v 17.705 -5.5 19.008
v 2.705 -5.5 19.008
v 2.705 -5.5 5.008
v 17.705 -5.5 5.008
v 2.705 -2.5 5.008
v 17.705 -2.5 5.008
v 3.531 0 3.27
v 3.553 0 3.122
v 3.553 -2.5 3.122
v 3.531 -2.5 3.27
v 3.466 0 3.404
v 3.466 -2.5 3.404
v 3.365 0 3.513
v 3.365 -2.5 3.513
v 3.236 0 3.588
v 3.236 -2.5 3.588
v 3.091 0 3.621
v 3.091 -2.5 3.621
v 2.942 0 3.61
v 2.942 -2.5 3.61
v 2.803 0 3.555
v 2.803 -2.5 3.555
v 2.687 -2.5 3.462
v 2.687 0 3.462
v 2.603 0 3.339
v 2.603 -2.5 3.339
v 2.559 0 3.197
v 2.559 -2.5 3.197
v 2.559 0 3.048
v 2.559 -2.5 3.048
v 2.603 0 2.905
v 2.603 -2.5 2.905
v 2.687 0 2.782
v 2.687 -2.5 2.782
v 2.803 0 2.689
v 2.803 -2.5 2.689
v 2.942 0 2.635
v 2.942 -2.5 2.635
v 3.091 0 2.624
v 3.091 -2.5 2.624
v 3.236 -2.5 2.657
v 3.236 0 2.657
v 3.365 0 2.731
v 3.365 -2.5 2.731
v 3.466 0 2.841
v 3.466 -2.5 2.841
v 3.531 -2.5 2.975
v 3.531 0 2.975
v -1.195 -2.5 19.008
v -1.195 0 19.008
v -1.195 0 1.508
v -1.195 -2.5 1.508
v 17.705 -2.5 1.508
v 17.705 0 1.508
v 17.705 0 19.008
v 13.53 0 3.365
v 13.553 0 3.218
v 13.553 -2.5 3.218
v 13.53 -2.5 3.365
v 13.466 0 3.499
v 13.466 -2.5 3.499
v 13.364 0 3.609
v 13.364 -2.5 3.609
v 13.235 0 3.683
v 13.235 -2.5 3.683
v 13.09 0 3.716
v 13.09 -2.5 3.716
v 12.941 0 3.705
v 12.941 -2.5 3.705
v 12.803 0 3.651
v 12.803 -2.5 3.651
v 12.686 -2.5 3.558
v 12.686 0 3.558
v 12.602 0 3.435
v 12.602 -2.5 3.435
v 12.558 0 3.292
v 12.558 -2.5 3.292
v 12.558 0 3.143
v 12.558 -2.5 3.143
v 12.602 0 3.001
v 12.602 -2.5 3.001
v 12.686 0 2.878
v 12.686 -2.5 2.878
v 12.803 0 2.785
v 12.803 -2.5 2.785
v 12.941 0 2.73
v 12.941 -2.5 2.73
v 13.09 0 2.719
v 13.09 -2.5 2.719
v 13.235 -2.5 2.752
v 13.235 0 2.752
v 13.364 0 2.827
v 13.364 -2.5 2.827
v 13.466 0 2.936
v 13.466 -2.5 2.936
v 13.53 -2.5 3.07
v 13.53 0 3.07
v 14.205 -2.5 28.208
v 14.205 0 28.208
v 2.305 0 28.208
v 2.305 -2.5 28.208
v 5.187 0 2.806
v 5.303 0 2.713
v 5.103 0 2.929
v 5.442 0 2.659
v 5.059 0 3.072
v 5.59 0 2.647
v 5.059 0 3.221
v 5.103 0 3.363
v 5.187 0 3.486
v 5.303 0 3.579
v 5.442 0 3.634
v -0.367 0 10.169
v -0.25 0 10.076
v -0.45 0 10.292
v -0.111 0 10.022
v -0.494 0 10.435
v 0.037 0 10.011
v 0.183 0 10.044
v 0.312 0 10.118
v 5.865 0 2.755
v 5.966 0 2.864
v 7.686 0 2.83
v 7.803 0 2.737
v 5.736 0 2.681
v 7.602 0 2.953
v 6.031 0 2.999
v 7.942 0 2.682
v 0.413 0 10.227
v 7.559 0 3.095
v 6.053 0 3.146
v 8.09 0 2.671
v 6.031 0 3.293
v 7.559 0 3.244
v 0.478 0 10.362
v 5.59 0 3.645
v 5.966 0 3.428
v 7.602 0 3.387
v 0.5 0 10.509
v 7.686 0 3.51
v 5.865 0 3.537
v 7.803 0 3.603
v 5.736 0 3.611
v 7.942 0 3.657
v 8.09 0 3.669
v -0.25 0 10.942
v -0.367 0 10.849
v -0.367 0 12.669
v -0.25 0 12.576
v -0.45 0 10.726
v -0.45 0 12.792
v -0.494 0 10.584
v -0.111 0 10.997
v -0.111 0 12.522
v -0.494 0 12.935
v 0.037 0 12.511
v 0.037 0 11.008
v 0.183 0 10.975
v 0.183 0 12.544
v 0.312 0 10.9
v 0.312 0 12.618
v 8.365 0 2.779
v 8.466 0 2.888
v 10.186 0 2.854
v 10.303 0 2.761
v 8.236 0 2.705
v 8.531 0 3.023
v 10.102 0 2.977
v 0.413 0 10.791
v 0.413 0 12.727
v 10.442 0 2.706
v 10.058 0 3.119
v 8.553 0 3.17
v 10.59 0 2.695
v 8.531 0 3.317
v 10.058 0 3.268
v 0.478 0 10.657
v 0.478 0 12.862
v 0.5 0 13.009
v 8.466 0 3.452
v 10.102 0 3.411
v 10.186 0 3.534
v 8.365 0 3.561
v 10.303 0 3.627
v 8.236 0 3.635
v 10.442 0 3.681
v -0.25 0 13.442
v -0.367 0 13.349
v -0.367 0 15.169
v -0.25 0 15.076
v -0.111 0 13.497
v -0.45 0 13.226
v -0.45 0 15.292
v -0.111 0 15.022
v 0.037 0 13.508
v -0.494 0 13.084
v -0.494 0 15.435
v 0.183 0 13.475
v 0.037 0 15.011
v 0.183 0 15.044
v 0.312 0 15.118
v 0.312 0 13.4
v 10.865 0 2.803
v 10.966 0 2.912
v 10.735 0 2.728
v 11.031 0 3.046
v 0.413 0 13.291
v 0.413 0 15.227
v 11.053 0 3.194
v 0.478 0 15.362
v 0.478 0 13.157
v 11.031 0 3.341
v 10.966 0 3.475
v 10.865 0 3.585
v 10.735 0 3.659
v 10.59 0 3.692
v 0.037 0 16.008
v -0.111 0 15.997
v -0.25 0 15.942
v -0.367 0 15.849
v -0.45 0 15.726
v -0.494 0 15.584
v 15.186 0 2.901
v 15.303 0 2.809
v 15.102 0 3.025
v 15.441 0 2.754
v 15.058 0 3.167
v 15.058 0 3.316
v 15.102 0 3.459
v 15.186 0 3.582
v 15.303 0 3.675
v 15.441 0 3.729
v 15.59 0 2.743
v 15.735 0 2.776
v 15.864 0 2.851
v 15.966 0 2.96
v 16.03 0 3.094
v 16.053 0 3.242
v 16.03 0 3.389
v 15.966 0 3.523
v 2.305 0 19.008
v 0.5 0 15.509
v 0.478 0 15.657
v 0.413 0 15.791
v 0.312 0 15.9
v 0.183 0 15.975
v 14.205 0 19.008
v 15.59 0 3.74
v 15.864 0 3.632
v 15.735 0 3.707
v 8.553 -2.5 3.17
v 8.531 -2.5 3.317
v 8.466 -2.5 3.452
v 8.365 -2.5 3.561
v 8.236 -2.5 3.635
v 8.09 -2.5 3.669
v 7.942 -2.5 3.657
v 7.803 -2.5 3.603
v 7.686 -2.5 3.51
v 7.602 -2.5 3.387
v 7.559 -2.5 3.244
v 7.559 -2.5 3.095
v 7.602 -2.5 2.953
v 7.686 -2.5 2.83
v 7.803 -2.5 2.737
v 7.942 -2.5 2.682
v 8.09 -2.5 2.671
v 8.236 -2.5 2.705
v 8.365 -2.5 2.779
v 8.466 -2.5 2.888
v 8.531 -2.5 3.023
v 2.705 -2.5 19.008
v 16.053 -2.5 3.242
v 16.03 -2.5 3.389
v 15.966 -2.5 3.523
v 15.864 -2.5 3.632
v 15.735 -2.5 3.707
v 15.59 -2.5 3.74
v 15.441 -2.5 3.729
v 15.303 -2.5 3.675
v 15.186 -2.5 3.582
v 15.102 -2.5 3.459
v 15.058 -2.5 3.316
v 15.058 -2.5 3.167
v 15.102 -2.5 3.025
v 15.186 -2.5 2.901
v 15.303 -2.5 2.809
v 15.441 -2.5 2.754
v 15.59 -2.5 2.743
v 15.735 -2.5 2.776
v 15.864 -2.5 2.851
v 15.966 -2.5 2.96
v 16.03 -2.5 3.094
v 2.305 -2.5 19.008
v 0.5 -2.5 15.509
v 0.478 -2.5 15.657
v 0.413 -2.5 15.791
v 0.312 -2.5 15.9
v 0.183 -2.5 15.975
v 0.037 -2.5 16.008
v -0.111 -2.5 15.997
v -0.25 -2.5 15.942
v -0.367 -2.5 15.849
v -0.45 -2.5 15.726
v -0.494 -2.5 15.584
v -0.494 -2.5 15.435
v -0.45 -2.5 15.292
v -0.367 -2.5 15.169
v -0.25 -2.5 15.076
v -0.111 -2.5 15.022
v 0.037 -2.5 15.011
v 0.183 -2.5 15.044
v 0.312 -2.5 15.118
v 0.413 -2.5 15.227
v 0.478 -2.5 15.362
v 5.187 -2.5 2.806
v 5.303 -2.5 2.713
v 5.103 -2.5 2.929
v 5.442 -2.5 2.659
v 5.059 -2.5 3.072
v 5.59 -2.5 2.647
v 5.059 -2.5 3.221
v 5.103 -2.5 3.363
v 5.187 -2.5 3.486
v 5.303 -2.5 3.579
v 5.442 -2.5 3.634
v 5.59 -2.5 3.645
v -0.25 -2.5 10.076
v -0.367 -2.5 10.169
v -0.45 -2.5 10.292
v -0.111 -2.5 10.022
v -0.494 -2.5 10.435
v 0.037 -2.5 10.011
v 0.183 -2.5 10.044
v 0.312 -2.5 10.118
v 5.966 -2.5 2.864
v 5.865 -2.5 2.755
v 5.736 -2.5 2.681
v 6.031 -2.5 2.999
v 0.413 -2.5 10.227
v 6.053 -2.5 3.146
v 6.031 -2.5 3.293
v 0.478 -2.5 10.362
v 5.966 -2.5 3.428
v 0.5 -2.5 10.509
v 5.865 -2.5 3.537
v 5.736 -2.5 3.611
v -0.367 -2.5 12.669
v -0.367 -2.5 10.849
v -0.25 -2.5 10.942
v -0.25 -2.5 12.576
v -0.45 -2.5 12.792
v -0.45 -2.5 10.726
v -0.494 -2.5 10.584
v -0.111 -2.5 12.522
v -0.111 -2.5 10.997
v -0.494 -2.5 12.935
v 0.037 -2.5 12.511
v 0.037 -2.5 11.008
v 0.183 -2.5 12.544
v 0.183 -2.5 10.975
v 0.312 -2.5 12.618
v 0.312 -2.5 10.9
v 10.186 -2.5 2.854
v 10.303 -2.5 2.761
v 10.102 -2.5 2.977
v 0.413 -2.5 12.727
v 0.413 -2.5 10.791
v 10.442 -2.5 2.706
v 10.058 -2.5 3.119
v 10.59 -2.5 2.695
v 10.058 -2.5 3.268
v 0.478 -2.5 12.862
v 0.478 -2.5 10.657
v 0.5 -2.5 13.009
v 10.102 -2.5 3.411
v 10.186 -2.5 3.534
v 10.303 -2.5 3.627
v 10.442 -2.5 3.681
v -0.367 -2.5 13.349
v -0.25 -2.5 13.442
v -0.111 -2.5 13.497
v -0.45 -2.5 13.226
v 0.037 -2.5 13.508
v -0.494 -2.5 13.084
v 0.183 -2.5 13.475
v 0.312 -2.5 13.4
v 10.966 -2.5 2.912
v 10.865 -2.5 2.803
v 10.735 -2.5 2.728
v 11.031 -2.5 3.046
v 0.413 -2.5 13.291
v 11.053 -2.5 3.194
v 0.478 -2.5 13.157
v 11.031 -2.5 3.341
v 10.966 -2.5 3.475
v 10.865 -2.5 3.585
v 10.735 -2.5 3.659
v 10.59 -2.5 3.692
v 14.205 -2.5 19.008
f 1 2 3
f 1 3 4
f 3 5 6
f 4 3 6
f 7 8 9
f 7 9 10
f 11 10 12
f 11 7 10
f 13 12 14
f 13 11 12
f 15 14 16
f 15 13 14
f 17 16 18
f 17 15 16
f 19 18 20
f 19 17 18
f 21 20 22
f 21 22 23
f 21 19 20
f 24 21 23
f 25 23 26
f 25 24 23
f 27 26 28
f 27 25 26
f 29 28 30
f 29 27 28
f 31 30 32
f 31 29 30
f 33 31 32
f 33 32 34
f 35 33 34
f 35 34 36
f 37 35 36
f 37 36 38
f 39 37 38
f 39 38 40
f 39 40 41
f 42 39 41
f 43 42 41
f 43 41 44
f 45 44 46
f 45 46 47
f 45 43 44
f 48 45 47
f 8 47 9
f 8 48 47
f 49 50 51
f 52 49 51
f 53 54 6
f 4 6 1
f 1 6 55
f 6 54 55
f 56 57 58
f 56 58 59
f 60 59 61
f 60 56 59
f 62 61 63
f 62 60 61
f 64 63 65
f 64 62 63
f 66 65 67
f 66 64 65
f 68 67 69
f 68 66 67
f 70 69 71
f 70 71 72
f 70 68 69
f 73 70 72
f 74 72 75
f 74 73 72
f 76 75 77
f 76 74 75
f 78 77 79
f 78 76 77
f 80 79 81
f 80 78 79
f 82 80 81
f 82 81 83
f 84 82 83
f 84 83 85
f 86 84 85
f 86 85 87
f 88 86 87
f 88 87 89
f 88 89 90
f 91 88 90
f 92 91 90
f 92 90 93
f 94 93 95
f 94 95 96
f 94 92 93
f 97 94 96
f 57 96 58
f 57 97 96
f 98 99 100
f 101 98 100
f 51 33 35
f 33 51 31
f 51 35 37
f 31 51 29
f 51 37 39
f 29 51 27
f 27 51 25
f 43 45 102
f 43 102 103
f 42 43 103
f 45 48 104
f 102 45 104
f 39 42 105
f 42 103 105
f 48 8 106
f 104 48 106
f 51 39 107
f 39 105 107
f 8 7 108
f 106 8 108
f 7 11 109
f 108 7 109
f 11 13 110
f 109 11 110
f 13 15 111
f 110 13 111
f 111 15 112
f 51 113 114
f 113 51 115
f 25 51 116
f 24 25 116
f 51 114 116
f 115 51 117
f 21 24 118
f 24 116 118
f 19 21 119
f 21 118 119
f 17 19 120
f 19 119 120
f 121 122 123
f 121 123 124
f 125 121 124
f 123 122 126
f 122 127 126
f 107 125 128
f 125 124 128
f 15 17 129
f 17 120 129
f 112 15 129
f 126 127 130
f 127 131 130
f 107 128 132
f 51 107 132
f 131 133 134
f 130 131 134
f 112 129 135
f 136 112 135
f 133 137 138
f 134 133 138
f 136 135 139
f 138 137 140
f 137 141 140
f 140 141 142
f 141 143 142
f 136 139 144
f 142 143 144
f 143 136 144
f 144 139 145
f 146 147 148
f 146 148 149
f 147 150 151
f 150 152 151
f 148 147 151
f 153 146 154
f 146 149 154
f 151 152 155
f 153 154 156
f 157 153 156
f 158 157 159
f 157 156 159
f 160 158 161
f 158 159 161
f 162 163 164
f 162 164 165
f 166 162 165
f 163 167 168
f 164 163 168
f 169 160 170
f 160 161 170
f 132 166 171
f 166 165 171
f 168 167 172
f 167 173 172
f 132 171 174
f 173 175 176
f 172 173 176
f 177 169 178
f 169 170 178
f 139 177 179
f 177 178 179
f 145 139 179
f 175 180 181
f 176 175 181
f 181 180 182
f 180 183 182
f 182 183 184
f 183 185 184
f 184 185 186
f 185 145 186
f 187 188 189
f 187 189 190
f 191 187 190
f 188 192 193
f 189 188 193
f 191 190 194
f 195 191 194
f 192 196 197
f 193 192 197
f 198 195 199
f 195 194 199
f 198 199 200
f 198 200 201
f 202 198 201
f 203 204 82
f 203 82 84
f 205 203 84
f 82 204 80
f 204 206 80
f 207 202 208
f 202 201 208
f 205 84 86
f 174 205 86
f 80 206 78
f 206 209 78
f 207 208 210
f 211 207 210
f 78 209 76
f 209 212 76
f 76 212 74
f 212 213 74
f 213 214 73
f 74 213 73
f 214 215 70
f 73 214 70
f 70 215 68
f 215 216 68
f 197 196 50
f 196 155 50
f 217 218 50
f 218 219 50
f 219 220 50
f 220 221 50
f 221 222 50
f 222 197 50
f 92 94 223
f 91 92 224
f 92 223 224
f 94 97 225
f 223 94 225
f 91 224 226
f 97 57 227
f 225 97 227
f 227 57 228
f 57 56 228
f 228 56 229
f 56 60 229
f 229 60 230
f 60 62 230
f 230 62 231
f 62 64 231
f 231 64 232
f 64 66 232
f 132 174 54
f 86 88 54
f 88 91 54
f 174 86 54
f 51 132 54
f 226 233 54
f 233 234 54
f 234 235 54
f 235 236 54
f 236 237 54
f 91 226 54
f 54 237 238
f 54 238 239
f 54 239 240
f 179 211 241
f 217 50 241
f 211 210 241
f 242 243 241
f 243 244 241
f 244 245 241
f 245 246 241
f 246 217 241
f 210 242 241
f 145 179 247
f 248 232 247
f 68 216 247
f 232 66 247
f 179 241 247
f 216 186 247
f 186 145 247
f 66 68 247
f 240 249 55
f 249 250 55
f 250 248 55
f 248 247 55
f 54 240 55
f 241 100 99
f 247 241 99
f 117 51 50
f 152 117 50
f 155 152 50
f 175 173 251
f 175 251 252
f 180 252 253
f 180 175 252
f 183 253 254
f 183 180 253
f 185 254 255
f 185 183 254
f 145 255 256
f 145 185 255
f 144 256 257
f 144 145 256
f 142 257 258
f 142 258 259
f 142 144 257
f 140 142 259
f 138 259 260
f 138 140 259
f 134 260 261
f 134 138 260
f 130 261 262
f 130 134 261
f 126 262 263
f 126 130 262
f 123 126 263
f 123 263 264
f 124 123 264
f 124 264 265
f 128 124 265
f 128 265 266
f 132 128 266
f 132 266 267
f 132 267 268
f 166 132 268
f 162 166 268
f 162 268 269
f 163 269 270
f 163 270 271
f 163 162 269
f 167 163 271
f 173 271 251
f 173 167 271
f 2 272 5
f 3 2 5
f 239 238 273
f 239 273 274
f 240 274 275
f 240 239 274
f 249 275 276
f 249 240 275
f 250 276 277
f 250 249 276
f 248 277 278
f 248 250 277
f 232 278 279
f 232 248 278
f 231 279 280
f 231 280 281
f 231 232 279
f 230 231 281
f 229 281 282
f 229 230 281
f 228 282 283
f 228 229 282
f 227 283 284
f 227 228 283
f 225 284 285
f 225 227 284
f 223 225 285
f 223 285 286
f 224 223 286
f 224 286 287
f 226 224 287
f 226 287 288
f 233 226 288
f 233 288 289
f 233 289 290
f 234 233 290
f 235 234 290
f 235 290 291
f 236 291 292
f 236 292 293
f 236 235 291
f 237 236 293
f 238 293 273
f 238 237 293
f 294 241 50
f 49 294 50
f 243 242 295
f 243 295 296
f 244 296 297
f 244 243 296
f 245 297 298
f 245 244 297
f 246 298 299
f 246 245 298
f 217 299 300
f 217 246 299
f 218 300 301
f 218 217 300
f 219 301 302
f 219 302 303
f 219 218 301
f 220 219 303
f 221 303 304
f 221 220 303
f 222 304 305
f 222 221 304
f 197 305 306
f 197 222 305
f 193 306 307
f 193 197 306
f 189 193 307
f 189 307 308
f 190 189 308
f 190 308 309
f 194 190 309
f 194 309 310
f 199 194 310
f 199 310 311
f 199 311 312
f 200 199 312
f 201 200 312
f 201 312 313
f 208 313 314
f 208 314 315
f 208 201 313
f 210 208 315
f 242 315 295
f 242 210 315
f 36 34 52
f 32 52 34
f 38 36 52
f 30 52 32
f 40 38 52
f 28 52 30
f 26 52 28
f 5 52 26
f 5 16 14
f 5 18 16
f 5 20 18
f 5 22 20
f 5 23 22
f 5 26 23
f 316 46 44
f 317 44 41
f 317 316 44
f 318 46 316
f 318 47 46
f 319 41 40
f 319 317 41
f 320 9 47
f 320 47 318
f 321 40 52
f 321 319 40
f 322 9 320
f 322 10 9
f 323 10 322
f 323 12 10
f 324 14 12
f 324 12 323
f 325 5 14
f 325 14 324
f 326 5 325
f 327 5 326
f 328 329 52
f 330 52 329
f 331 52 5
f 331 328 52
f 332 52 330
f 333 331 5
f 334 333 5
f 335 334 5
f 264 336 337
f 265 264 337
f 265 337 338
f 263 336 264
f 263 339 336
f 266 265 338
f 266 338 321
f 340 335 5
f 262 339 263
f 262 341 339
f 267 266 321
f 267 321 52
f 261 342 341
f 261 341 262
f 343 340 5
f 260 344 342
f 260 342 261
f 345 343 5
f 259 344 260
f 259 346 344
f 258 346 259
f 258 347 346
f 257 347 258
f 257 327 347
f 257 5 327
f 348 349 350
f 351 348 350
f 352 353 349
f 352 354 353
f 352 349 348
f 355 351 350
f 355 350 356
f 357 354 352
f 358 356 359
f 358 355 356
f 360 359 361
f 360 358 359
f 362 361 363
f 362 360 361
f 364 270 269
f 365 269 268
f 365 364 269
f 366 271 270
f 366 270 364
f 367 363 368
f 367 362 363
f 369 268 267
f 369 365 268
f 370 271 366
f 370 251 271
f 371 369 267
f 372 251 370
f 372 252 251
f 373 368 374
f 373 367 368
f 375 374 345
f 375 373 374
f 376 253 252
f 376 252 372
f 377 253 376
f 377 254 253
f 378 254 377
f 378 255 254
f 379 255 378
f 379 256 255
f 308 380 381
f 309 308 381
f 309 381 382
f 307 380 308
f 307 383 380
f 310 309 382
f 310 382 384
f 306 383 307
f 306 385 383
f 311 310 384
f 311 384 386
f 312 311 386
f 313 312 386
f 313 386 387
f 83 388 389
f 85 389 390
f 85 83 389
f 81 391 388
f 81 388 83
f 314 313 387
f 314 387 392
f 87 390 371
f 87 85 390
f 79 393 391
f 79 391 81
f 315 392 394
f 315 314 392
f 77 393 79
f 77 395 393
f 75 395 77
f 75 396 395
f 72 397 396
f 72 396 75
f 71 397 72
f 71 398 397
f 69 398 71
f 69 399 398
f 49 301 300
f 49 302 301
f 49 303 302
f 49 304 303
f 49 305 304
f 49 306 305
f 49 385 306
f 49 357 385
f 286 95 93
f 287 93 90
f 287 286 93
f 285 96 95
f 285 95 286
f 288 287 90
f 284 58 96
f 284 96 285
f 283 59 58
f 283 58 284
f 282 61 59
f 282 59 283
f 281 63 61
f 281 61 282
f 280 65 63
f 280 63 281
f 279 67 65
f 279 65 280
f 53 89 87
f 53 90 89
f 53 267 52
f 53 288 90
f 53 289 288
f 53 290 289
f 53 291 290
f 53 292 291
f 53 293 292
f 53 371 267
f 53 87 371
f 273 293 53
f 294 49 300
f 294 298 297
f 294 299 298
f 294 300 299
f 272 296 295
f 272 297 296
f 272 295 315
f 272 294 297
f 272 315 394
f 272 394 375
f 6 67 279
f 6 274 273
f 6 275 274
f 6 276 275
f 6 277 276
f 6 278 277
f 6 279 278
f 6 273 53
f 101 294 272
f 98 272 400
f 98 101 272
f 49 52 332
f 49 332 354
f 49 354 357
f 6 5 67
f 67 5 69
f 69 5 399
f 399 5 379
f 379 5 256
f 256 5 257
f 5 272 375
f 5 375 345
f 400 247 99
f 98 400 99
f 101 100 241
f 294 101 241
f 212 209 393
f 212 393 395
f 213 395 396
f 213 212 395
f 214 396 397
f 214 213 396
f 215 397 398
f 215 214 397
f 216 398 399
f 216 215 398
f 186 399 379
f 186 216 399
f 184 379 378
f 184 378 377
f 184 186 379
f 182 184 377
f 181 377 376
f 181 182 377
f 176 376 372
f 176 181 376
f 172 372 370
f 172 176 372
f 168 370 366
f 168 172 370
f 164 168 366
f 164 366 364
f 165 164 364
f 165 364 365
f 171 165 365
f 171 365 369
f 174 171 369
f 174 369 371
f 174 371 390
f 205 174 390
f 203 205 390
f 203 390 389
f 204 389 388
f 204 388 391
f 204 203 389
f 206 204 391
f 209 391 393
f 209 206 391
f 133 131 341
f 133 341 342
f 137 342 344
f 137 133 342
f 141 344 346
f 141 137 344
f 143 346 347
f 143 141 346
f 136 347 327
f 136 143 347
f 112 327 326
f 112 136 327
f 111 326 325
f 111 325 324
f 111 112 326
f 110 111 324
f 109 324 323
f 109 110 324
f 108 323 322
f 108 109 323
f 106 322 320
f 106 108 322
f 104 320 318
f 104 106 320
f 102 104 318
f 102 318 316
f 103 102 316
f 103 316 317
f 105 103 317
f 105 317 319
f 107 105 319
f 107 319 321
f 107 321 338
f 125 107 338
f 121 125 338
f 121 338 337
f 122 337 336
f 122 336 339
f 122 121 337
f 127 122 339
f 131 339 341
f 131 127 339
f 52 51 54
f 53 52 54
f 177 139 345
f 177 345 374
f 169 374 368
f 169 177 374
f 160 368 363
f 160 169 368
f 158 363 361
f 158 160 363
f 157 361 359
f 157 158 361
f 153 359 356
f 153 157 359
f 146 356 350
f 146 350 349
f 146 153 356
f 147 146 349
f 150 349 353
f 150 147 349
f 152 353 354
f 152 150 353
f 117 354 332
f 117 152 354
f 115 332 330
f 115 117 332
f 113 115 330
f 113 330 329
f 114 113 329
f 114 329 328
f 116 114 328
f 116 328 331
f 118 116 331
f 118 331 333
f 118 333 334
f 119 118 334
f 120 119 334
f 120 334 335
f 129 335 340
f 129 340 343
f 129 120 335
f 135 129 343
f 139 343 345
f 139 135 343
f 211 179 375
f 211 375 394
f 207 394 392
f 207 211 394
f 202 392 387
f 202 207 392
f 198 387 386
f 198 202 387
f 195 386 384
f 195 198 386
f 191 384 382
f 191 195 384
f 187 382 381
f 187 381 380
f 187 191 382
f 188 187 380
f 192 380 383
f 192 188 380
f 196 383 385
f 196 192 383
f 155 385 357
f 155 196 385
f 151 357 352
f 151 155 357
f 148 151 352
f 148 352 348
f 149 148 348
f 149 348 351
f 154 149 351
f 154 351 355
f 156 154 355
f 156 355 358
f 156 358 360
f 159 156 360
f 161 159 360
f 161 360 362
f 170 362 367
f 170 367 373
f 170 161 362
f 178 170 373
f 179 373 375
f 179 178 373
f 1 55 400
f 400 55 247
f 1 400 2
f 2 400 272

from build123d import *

# Parameters (mm, degrees)
F1_DEPTH = 5.5
F0_R     = 0.5
F2_DEPTH = 2.5


with BuildPart() as f1:
    # F0 (on Front) → F1 (new body)
    with BuildSketch(Plane.XZ):
        Polygon((14.10483, 19.007904), (2.70483, 19.007904), (2.70483, 5.007904), (17.70483, 5.007904), (17.70483, 19.007904), (14.864999, 19.007904), (14.50483, 19.007904), (14.20483, 19.007904), align=None)
    extrude(amount=F1_DEPTH)

    # F0 (on Front) → F2 (join)
    with BuildSketch(Plane.XZ):
        Polygon((2.30483, 19.007904), (-1.19517, 19.007904), (-1.19517, 1.507904), (17.70483, 1.507904), (17.70483, 5.007904), (2.70483, 5.007904), (2.70483, 19.007904), align=None)
        with Locations((3.05315, 3.12218)):
            Circle(F0_R, mode=Mode.SUBTRACT)
        with Locations((5.553036, 3.146059)):
            Circle(F0_R, mode=Mode.SUBTRACT)
        with Locations((8.052922, 3.169939)):
            Circle(F0_R, mode=Mode.SUBTRACT)
        with Locations((0, 10.509157)):
            Circle(F0_R, mode=Mode.SUBTRACT)
        with Locations((0, 13.009157)):
            Circle(F0_R, mode=Mode.SUBTRACT)
        with Locations((10.552808, 3.193818)):
            Circle(F0_R, mode=Mode.SUBTRACT)
        with Locations((13.052693, 3.217697)):
            Circle(F0_R, mode=Mode.SUBTRACT)
        with Locations((15.552579, 3.241576)):
            Circle(F0_R, mode=Mode.SUBTRACT)
        with Locations((0, 15.509157)):
            Circle(F0_R, mode=Mode.SUBTRACT)
        Polygon((2.30483, 28.207904), (2.30483, 19.007904), (2.70483, 19.007904), (14.10483, 19.007904), (14.20483, 19.007904), (14.20483, 28.207904), align=None)
        Polygon((14.10483, 19.007904), (2.70483, 19.007904), (2.70483, 5.007904), (17.70483, 5.007904), (17.70483, 19.007904), (14.864999, 19.007904), (14.50483, 19.007904), (14.20483, 19.007904), align=None)
    extrude(amount=F2_DEPTH)


solid = f1.part
